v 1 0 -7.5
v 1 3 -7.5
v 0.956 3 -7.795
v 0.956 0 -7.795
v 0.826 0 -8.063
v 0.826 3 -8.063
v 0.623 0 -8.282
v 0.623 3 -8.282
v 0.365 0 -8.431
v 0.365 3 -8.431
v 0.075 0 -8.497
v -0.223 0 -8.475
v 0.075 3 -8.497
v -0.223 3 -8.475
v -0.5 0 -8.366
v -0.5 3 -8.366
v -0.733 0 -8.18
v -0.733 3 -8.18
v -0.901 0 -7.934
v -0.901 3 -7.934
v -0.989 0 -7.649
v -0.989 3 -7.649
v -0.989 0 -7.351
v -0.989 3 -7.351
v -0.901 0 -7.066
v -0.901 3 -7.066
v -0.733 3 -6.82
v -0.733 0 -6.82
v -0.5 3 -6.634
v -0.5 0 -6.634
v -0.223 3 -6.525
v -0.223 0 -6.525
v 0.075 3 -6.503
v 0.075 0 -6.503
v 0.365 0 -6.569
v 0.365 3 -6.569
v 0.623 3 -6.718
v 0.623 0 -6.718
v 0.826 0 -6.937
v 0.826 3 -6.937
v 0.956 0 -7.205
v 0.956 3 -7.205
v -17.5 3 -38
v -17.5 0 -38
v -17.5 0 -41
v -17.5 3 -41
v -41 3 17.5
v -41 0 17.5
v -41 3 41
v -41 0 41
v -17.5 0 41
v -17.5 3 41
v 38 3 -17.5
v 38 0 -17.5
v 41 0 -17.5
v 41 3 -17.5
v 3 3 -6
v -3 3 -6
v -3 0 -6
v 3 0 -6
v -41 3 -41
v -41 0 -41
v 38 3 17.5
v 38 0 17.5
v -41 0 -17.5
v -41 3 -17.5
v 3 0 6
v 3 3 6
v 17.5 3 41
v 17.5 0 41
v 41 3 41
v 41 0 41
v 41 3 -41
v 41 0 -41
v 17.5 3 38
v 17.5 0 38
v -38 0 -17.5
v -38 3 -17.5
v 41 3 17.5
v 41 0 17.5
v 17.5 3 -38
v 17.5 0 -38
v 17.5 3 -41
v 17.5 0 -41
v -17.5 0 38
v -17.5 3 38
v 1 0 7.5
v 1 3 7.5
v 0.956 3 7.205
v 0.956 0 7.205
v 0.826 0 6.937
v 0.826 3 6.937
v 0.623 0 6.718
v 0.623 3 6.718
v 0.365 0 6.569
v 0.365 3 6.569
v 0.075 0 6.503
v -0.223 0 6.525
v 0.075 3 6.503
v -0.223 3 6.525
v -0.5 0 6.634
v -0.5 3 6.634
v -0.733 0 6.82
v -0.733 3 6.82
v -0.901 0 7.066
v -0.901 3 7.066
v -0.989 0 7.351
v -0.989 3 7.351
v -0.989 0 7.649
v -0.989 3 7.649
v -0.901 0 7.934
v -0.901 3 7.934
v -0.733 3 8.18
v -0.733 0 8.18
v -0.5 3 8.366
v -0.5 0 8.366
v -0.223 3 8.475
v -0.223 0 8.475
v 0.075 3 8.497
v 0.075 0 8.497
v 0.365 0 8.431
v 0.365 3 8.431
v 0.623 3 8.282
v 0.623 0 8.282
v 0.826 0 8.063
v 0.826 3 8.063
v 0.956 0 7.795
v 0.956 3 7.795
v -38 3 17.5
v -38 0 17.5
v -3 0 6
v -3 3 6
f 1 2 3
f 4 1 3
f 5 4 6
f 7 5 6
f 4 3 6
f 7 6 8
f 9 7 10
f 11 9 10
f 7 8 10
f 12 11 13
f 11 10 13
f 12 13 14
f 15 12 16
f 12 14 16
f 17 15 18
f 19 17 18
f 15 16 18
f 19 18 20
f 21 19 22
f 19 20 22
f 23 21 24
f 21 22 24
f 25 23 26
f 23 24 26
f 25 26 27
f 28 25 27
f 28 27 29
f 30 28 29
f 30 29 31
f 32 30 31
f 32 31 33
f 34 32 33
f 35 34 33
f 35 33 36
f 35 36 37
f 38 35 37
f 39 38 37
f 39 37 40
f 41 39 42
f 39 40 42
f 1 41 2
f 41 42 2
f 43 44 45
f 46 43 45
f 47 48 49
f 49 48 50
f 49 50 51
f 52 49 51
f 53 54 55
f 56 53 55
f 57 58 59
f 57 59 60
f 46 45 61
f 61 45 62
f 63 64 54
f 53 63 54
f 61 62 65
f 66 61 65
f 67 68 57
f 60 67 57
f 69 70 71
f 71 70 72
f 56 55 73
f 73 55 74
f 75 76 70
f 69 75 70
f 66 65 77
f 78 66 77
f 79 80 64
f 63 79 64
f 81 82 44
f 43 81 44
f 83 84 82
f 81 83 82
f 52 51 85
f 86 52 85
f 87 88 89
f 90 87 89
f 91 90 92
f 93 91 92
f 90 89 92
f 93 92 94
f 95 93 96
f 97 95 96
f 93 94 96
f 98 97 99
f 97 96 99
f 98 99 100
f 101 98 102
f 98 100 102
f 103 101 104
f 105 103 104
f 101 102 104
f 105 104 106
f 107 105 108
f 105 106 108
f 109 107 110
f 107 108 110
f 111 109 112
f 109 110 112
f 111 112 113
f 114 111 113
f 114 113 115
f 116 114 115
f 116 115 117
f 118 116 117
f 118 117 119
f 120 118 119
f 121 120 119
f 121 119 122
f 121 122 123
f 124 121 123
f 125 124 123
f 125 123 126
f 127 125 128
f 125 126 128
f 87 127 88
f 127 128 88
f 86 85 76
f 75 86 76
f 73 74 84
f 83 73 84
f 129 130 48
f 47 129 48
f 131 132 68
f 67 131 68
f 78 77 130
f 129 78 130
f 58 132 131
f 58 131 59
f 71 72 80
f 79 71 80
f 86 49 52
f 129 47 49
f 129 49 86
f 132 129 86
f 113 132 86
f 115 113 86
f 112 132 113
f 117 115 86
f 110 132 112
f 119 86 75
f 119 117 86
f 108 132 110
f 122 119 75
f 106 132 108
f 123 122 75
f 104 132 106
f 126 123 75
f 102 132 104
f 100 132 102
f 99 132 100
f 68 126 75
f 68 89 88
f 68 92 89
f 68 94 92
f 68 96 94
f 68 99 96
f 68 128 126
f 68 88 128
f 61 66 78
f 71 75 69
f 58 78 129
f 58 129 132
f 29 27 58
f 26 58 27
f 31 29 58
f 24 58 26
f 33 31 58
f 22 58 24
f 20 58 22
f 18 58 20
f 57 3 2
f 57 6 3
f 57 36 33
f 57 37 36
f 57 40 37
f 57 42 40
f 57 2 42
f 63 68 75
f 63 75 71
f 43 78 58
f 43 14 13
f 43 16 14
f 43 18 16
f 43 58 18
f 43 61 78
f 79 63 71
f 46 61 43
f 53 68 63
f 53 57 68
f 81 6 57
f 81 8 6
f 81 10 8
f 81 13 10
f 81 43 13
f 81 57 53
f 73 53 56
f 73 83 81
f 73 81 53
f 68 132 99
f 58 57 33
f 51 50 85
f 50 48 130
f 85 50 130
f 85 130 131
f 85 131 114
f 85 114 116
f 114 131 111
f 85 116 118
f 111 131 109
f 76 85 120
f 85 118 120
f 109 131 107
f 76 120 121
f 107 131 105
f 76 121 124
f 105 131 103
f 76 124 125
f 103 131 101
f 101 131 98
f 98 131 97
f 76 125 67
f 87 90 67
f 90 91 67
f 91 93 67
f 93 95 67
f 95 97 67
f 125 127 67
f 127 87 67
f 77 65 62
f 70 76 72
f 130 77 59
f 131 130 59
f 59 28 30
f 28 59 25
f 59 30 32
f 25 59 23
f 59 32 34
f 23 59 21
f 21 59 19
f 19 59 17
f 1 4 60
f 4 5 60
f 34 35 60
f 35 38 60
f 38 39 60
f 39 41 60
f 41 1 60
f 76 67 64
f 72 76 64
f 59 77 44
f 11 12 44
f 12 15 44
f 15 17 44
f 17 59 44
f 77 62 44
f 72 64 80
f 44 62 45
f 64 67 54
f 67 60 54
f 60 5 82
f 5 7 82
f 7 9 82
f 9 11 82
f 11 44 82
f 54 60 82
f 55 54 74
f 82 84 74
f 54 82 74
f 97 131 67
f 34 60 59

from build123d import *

# Parameters (mm, degrees)
BOSS_EXTRUDE1_DEPTH = 3
SKETCH2_R           = 1
SKETCH2_W           = 6
SKETCH2_H           = 12
CUT_EXTRUDE1_DEPTH  = 3


with BuildPart() as part:
    # Sketch1 → Boss-Extrude1 (new body)
    with BuildSketch(Plane(origin=(0, 0, 0), x_dir=(1, 0, 0), z_dir=(0, 1, 0))):
        Polygon((-41, -41), (-17.5, -41), (-17.5, -38), (17.5, -38), (17.5, -41), (41, -41), (41, -17.5), (38, -17.5), (38, 17.5), (41, 17.5), (41, 41), (17.5, 41), (17.5, 38), (-17.5, 38), (-17.5, 41), (-41, 41), (-41, 17.5), (-38, 17.5), (-38, -17.5), (-41, -17.5), align=None)
    extrude(amount=BOSS_EXTRUDE1_DEPTH)

    # Sketch2 → Cut-Extrude1 (cut)
    with BuildSketch(Plane(origin=(0, 3, 0), x_dir=(1, 0, 0), z_dir=(0, 1, 0))):
        with Locations((0, 7.5)):
            Circle(SKETCH2_R)
        with Locations((0, -7.5)):
            Circle(SKETCH2_R)
        Rectangle(SKETCH2_W, SKETCH2_H)
    extrude(amount=-CUT_EXTRUDE1_DEPTH, mode=Mode.SUBTRACT)


solid = part.part
